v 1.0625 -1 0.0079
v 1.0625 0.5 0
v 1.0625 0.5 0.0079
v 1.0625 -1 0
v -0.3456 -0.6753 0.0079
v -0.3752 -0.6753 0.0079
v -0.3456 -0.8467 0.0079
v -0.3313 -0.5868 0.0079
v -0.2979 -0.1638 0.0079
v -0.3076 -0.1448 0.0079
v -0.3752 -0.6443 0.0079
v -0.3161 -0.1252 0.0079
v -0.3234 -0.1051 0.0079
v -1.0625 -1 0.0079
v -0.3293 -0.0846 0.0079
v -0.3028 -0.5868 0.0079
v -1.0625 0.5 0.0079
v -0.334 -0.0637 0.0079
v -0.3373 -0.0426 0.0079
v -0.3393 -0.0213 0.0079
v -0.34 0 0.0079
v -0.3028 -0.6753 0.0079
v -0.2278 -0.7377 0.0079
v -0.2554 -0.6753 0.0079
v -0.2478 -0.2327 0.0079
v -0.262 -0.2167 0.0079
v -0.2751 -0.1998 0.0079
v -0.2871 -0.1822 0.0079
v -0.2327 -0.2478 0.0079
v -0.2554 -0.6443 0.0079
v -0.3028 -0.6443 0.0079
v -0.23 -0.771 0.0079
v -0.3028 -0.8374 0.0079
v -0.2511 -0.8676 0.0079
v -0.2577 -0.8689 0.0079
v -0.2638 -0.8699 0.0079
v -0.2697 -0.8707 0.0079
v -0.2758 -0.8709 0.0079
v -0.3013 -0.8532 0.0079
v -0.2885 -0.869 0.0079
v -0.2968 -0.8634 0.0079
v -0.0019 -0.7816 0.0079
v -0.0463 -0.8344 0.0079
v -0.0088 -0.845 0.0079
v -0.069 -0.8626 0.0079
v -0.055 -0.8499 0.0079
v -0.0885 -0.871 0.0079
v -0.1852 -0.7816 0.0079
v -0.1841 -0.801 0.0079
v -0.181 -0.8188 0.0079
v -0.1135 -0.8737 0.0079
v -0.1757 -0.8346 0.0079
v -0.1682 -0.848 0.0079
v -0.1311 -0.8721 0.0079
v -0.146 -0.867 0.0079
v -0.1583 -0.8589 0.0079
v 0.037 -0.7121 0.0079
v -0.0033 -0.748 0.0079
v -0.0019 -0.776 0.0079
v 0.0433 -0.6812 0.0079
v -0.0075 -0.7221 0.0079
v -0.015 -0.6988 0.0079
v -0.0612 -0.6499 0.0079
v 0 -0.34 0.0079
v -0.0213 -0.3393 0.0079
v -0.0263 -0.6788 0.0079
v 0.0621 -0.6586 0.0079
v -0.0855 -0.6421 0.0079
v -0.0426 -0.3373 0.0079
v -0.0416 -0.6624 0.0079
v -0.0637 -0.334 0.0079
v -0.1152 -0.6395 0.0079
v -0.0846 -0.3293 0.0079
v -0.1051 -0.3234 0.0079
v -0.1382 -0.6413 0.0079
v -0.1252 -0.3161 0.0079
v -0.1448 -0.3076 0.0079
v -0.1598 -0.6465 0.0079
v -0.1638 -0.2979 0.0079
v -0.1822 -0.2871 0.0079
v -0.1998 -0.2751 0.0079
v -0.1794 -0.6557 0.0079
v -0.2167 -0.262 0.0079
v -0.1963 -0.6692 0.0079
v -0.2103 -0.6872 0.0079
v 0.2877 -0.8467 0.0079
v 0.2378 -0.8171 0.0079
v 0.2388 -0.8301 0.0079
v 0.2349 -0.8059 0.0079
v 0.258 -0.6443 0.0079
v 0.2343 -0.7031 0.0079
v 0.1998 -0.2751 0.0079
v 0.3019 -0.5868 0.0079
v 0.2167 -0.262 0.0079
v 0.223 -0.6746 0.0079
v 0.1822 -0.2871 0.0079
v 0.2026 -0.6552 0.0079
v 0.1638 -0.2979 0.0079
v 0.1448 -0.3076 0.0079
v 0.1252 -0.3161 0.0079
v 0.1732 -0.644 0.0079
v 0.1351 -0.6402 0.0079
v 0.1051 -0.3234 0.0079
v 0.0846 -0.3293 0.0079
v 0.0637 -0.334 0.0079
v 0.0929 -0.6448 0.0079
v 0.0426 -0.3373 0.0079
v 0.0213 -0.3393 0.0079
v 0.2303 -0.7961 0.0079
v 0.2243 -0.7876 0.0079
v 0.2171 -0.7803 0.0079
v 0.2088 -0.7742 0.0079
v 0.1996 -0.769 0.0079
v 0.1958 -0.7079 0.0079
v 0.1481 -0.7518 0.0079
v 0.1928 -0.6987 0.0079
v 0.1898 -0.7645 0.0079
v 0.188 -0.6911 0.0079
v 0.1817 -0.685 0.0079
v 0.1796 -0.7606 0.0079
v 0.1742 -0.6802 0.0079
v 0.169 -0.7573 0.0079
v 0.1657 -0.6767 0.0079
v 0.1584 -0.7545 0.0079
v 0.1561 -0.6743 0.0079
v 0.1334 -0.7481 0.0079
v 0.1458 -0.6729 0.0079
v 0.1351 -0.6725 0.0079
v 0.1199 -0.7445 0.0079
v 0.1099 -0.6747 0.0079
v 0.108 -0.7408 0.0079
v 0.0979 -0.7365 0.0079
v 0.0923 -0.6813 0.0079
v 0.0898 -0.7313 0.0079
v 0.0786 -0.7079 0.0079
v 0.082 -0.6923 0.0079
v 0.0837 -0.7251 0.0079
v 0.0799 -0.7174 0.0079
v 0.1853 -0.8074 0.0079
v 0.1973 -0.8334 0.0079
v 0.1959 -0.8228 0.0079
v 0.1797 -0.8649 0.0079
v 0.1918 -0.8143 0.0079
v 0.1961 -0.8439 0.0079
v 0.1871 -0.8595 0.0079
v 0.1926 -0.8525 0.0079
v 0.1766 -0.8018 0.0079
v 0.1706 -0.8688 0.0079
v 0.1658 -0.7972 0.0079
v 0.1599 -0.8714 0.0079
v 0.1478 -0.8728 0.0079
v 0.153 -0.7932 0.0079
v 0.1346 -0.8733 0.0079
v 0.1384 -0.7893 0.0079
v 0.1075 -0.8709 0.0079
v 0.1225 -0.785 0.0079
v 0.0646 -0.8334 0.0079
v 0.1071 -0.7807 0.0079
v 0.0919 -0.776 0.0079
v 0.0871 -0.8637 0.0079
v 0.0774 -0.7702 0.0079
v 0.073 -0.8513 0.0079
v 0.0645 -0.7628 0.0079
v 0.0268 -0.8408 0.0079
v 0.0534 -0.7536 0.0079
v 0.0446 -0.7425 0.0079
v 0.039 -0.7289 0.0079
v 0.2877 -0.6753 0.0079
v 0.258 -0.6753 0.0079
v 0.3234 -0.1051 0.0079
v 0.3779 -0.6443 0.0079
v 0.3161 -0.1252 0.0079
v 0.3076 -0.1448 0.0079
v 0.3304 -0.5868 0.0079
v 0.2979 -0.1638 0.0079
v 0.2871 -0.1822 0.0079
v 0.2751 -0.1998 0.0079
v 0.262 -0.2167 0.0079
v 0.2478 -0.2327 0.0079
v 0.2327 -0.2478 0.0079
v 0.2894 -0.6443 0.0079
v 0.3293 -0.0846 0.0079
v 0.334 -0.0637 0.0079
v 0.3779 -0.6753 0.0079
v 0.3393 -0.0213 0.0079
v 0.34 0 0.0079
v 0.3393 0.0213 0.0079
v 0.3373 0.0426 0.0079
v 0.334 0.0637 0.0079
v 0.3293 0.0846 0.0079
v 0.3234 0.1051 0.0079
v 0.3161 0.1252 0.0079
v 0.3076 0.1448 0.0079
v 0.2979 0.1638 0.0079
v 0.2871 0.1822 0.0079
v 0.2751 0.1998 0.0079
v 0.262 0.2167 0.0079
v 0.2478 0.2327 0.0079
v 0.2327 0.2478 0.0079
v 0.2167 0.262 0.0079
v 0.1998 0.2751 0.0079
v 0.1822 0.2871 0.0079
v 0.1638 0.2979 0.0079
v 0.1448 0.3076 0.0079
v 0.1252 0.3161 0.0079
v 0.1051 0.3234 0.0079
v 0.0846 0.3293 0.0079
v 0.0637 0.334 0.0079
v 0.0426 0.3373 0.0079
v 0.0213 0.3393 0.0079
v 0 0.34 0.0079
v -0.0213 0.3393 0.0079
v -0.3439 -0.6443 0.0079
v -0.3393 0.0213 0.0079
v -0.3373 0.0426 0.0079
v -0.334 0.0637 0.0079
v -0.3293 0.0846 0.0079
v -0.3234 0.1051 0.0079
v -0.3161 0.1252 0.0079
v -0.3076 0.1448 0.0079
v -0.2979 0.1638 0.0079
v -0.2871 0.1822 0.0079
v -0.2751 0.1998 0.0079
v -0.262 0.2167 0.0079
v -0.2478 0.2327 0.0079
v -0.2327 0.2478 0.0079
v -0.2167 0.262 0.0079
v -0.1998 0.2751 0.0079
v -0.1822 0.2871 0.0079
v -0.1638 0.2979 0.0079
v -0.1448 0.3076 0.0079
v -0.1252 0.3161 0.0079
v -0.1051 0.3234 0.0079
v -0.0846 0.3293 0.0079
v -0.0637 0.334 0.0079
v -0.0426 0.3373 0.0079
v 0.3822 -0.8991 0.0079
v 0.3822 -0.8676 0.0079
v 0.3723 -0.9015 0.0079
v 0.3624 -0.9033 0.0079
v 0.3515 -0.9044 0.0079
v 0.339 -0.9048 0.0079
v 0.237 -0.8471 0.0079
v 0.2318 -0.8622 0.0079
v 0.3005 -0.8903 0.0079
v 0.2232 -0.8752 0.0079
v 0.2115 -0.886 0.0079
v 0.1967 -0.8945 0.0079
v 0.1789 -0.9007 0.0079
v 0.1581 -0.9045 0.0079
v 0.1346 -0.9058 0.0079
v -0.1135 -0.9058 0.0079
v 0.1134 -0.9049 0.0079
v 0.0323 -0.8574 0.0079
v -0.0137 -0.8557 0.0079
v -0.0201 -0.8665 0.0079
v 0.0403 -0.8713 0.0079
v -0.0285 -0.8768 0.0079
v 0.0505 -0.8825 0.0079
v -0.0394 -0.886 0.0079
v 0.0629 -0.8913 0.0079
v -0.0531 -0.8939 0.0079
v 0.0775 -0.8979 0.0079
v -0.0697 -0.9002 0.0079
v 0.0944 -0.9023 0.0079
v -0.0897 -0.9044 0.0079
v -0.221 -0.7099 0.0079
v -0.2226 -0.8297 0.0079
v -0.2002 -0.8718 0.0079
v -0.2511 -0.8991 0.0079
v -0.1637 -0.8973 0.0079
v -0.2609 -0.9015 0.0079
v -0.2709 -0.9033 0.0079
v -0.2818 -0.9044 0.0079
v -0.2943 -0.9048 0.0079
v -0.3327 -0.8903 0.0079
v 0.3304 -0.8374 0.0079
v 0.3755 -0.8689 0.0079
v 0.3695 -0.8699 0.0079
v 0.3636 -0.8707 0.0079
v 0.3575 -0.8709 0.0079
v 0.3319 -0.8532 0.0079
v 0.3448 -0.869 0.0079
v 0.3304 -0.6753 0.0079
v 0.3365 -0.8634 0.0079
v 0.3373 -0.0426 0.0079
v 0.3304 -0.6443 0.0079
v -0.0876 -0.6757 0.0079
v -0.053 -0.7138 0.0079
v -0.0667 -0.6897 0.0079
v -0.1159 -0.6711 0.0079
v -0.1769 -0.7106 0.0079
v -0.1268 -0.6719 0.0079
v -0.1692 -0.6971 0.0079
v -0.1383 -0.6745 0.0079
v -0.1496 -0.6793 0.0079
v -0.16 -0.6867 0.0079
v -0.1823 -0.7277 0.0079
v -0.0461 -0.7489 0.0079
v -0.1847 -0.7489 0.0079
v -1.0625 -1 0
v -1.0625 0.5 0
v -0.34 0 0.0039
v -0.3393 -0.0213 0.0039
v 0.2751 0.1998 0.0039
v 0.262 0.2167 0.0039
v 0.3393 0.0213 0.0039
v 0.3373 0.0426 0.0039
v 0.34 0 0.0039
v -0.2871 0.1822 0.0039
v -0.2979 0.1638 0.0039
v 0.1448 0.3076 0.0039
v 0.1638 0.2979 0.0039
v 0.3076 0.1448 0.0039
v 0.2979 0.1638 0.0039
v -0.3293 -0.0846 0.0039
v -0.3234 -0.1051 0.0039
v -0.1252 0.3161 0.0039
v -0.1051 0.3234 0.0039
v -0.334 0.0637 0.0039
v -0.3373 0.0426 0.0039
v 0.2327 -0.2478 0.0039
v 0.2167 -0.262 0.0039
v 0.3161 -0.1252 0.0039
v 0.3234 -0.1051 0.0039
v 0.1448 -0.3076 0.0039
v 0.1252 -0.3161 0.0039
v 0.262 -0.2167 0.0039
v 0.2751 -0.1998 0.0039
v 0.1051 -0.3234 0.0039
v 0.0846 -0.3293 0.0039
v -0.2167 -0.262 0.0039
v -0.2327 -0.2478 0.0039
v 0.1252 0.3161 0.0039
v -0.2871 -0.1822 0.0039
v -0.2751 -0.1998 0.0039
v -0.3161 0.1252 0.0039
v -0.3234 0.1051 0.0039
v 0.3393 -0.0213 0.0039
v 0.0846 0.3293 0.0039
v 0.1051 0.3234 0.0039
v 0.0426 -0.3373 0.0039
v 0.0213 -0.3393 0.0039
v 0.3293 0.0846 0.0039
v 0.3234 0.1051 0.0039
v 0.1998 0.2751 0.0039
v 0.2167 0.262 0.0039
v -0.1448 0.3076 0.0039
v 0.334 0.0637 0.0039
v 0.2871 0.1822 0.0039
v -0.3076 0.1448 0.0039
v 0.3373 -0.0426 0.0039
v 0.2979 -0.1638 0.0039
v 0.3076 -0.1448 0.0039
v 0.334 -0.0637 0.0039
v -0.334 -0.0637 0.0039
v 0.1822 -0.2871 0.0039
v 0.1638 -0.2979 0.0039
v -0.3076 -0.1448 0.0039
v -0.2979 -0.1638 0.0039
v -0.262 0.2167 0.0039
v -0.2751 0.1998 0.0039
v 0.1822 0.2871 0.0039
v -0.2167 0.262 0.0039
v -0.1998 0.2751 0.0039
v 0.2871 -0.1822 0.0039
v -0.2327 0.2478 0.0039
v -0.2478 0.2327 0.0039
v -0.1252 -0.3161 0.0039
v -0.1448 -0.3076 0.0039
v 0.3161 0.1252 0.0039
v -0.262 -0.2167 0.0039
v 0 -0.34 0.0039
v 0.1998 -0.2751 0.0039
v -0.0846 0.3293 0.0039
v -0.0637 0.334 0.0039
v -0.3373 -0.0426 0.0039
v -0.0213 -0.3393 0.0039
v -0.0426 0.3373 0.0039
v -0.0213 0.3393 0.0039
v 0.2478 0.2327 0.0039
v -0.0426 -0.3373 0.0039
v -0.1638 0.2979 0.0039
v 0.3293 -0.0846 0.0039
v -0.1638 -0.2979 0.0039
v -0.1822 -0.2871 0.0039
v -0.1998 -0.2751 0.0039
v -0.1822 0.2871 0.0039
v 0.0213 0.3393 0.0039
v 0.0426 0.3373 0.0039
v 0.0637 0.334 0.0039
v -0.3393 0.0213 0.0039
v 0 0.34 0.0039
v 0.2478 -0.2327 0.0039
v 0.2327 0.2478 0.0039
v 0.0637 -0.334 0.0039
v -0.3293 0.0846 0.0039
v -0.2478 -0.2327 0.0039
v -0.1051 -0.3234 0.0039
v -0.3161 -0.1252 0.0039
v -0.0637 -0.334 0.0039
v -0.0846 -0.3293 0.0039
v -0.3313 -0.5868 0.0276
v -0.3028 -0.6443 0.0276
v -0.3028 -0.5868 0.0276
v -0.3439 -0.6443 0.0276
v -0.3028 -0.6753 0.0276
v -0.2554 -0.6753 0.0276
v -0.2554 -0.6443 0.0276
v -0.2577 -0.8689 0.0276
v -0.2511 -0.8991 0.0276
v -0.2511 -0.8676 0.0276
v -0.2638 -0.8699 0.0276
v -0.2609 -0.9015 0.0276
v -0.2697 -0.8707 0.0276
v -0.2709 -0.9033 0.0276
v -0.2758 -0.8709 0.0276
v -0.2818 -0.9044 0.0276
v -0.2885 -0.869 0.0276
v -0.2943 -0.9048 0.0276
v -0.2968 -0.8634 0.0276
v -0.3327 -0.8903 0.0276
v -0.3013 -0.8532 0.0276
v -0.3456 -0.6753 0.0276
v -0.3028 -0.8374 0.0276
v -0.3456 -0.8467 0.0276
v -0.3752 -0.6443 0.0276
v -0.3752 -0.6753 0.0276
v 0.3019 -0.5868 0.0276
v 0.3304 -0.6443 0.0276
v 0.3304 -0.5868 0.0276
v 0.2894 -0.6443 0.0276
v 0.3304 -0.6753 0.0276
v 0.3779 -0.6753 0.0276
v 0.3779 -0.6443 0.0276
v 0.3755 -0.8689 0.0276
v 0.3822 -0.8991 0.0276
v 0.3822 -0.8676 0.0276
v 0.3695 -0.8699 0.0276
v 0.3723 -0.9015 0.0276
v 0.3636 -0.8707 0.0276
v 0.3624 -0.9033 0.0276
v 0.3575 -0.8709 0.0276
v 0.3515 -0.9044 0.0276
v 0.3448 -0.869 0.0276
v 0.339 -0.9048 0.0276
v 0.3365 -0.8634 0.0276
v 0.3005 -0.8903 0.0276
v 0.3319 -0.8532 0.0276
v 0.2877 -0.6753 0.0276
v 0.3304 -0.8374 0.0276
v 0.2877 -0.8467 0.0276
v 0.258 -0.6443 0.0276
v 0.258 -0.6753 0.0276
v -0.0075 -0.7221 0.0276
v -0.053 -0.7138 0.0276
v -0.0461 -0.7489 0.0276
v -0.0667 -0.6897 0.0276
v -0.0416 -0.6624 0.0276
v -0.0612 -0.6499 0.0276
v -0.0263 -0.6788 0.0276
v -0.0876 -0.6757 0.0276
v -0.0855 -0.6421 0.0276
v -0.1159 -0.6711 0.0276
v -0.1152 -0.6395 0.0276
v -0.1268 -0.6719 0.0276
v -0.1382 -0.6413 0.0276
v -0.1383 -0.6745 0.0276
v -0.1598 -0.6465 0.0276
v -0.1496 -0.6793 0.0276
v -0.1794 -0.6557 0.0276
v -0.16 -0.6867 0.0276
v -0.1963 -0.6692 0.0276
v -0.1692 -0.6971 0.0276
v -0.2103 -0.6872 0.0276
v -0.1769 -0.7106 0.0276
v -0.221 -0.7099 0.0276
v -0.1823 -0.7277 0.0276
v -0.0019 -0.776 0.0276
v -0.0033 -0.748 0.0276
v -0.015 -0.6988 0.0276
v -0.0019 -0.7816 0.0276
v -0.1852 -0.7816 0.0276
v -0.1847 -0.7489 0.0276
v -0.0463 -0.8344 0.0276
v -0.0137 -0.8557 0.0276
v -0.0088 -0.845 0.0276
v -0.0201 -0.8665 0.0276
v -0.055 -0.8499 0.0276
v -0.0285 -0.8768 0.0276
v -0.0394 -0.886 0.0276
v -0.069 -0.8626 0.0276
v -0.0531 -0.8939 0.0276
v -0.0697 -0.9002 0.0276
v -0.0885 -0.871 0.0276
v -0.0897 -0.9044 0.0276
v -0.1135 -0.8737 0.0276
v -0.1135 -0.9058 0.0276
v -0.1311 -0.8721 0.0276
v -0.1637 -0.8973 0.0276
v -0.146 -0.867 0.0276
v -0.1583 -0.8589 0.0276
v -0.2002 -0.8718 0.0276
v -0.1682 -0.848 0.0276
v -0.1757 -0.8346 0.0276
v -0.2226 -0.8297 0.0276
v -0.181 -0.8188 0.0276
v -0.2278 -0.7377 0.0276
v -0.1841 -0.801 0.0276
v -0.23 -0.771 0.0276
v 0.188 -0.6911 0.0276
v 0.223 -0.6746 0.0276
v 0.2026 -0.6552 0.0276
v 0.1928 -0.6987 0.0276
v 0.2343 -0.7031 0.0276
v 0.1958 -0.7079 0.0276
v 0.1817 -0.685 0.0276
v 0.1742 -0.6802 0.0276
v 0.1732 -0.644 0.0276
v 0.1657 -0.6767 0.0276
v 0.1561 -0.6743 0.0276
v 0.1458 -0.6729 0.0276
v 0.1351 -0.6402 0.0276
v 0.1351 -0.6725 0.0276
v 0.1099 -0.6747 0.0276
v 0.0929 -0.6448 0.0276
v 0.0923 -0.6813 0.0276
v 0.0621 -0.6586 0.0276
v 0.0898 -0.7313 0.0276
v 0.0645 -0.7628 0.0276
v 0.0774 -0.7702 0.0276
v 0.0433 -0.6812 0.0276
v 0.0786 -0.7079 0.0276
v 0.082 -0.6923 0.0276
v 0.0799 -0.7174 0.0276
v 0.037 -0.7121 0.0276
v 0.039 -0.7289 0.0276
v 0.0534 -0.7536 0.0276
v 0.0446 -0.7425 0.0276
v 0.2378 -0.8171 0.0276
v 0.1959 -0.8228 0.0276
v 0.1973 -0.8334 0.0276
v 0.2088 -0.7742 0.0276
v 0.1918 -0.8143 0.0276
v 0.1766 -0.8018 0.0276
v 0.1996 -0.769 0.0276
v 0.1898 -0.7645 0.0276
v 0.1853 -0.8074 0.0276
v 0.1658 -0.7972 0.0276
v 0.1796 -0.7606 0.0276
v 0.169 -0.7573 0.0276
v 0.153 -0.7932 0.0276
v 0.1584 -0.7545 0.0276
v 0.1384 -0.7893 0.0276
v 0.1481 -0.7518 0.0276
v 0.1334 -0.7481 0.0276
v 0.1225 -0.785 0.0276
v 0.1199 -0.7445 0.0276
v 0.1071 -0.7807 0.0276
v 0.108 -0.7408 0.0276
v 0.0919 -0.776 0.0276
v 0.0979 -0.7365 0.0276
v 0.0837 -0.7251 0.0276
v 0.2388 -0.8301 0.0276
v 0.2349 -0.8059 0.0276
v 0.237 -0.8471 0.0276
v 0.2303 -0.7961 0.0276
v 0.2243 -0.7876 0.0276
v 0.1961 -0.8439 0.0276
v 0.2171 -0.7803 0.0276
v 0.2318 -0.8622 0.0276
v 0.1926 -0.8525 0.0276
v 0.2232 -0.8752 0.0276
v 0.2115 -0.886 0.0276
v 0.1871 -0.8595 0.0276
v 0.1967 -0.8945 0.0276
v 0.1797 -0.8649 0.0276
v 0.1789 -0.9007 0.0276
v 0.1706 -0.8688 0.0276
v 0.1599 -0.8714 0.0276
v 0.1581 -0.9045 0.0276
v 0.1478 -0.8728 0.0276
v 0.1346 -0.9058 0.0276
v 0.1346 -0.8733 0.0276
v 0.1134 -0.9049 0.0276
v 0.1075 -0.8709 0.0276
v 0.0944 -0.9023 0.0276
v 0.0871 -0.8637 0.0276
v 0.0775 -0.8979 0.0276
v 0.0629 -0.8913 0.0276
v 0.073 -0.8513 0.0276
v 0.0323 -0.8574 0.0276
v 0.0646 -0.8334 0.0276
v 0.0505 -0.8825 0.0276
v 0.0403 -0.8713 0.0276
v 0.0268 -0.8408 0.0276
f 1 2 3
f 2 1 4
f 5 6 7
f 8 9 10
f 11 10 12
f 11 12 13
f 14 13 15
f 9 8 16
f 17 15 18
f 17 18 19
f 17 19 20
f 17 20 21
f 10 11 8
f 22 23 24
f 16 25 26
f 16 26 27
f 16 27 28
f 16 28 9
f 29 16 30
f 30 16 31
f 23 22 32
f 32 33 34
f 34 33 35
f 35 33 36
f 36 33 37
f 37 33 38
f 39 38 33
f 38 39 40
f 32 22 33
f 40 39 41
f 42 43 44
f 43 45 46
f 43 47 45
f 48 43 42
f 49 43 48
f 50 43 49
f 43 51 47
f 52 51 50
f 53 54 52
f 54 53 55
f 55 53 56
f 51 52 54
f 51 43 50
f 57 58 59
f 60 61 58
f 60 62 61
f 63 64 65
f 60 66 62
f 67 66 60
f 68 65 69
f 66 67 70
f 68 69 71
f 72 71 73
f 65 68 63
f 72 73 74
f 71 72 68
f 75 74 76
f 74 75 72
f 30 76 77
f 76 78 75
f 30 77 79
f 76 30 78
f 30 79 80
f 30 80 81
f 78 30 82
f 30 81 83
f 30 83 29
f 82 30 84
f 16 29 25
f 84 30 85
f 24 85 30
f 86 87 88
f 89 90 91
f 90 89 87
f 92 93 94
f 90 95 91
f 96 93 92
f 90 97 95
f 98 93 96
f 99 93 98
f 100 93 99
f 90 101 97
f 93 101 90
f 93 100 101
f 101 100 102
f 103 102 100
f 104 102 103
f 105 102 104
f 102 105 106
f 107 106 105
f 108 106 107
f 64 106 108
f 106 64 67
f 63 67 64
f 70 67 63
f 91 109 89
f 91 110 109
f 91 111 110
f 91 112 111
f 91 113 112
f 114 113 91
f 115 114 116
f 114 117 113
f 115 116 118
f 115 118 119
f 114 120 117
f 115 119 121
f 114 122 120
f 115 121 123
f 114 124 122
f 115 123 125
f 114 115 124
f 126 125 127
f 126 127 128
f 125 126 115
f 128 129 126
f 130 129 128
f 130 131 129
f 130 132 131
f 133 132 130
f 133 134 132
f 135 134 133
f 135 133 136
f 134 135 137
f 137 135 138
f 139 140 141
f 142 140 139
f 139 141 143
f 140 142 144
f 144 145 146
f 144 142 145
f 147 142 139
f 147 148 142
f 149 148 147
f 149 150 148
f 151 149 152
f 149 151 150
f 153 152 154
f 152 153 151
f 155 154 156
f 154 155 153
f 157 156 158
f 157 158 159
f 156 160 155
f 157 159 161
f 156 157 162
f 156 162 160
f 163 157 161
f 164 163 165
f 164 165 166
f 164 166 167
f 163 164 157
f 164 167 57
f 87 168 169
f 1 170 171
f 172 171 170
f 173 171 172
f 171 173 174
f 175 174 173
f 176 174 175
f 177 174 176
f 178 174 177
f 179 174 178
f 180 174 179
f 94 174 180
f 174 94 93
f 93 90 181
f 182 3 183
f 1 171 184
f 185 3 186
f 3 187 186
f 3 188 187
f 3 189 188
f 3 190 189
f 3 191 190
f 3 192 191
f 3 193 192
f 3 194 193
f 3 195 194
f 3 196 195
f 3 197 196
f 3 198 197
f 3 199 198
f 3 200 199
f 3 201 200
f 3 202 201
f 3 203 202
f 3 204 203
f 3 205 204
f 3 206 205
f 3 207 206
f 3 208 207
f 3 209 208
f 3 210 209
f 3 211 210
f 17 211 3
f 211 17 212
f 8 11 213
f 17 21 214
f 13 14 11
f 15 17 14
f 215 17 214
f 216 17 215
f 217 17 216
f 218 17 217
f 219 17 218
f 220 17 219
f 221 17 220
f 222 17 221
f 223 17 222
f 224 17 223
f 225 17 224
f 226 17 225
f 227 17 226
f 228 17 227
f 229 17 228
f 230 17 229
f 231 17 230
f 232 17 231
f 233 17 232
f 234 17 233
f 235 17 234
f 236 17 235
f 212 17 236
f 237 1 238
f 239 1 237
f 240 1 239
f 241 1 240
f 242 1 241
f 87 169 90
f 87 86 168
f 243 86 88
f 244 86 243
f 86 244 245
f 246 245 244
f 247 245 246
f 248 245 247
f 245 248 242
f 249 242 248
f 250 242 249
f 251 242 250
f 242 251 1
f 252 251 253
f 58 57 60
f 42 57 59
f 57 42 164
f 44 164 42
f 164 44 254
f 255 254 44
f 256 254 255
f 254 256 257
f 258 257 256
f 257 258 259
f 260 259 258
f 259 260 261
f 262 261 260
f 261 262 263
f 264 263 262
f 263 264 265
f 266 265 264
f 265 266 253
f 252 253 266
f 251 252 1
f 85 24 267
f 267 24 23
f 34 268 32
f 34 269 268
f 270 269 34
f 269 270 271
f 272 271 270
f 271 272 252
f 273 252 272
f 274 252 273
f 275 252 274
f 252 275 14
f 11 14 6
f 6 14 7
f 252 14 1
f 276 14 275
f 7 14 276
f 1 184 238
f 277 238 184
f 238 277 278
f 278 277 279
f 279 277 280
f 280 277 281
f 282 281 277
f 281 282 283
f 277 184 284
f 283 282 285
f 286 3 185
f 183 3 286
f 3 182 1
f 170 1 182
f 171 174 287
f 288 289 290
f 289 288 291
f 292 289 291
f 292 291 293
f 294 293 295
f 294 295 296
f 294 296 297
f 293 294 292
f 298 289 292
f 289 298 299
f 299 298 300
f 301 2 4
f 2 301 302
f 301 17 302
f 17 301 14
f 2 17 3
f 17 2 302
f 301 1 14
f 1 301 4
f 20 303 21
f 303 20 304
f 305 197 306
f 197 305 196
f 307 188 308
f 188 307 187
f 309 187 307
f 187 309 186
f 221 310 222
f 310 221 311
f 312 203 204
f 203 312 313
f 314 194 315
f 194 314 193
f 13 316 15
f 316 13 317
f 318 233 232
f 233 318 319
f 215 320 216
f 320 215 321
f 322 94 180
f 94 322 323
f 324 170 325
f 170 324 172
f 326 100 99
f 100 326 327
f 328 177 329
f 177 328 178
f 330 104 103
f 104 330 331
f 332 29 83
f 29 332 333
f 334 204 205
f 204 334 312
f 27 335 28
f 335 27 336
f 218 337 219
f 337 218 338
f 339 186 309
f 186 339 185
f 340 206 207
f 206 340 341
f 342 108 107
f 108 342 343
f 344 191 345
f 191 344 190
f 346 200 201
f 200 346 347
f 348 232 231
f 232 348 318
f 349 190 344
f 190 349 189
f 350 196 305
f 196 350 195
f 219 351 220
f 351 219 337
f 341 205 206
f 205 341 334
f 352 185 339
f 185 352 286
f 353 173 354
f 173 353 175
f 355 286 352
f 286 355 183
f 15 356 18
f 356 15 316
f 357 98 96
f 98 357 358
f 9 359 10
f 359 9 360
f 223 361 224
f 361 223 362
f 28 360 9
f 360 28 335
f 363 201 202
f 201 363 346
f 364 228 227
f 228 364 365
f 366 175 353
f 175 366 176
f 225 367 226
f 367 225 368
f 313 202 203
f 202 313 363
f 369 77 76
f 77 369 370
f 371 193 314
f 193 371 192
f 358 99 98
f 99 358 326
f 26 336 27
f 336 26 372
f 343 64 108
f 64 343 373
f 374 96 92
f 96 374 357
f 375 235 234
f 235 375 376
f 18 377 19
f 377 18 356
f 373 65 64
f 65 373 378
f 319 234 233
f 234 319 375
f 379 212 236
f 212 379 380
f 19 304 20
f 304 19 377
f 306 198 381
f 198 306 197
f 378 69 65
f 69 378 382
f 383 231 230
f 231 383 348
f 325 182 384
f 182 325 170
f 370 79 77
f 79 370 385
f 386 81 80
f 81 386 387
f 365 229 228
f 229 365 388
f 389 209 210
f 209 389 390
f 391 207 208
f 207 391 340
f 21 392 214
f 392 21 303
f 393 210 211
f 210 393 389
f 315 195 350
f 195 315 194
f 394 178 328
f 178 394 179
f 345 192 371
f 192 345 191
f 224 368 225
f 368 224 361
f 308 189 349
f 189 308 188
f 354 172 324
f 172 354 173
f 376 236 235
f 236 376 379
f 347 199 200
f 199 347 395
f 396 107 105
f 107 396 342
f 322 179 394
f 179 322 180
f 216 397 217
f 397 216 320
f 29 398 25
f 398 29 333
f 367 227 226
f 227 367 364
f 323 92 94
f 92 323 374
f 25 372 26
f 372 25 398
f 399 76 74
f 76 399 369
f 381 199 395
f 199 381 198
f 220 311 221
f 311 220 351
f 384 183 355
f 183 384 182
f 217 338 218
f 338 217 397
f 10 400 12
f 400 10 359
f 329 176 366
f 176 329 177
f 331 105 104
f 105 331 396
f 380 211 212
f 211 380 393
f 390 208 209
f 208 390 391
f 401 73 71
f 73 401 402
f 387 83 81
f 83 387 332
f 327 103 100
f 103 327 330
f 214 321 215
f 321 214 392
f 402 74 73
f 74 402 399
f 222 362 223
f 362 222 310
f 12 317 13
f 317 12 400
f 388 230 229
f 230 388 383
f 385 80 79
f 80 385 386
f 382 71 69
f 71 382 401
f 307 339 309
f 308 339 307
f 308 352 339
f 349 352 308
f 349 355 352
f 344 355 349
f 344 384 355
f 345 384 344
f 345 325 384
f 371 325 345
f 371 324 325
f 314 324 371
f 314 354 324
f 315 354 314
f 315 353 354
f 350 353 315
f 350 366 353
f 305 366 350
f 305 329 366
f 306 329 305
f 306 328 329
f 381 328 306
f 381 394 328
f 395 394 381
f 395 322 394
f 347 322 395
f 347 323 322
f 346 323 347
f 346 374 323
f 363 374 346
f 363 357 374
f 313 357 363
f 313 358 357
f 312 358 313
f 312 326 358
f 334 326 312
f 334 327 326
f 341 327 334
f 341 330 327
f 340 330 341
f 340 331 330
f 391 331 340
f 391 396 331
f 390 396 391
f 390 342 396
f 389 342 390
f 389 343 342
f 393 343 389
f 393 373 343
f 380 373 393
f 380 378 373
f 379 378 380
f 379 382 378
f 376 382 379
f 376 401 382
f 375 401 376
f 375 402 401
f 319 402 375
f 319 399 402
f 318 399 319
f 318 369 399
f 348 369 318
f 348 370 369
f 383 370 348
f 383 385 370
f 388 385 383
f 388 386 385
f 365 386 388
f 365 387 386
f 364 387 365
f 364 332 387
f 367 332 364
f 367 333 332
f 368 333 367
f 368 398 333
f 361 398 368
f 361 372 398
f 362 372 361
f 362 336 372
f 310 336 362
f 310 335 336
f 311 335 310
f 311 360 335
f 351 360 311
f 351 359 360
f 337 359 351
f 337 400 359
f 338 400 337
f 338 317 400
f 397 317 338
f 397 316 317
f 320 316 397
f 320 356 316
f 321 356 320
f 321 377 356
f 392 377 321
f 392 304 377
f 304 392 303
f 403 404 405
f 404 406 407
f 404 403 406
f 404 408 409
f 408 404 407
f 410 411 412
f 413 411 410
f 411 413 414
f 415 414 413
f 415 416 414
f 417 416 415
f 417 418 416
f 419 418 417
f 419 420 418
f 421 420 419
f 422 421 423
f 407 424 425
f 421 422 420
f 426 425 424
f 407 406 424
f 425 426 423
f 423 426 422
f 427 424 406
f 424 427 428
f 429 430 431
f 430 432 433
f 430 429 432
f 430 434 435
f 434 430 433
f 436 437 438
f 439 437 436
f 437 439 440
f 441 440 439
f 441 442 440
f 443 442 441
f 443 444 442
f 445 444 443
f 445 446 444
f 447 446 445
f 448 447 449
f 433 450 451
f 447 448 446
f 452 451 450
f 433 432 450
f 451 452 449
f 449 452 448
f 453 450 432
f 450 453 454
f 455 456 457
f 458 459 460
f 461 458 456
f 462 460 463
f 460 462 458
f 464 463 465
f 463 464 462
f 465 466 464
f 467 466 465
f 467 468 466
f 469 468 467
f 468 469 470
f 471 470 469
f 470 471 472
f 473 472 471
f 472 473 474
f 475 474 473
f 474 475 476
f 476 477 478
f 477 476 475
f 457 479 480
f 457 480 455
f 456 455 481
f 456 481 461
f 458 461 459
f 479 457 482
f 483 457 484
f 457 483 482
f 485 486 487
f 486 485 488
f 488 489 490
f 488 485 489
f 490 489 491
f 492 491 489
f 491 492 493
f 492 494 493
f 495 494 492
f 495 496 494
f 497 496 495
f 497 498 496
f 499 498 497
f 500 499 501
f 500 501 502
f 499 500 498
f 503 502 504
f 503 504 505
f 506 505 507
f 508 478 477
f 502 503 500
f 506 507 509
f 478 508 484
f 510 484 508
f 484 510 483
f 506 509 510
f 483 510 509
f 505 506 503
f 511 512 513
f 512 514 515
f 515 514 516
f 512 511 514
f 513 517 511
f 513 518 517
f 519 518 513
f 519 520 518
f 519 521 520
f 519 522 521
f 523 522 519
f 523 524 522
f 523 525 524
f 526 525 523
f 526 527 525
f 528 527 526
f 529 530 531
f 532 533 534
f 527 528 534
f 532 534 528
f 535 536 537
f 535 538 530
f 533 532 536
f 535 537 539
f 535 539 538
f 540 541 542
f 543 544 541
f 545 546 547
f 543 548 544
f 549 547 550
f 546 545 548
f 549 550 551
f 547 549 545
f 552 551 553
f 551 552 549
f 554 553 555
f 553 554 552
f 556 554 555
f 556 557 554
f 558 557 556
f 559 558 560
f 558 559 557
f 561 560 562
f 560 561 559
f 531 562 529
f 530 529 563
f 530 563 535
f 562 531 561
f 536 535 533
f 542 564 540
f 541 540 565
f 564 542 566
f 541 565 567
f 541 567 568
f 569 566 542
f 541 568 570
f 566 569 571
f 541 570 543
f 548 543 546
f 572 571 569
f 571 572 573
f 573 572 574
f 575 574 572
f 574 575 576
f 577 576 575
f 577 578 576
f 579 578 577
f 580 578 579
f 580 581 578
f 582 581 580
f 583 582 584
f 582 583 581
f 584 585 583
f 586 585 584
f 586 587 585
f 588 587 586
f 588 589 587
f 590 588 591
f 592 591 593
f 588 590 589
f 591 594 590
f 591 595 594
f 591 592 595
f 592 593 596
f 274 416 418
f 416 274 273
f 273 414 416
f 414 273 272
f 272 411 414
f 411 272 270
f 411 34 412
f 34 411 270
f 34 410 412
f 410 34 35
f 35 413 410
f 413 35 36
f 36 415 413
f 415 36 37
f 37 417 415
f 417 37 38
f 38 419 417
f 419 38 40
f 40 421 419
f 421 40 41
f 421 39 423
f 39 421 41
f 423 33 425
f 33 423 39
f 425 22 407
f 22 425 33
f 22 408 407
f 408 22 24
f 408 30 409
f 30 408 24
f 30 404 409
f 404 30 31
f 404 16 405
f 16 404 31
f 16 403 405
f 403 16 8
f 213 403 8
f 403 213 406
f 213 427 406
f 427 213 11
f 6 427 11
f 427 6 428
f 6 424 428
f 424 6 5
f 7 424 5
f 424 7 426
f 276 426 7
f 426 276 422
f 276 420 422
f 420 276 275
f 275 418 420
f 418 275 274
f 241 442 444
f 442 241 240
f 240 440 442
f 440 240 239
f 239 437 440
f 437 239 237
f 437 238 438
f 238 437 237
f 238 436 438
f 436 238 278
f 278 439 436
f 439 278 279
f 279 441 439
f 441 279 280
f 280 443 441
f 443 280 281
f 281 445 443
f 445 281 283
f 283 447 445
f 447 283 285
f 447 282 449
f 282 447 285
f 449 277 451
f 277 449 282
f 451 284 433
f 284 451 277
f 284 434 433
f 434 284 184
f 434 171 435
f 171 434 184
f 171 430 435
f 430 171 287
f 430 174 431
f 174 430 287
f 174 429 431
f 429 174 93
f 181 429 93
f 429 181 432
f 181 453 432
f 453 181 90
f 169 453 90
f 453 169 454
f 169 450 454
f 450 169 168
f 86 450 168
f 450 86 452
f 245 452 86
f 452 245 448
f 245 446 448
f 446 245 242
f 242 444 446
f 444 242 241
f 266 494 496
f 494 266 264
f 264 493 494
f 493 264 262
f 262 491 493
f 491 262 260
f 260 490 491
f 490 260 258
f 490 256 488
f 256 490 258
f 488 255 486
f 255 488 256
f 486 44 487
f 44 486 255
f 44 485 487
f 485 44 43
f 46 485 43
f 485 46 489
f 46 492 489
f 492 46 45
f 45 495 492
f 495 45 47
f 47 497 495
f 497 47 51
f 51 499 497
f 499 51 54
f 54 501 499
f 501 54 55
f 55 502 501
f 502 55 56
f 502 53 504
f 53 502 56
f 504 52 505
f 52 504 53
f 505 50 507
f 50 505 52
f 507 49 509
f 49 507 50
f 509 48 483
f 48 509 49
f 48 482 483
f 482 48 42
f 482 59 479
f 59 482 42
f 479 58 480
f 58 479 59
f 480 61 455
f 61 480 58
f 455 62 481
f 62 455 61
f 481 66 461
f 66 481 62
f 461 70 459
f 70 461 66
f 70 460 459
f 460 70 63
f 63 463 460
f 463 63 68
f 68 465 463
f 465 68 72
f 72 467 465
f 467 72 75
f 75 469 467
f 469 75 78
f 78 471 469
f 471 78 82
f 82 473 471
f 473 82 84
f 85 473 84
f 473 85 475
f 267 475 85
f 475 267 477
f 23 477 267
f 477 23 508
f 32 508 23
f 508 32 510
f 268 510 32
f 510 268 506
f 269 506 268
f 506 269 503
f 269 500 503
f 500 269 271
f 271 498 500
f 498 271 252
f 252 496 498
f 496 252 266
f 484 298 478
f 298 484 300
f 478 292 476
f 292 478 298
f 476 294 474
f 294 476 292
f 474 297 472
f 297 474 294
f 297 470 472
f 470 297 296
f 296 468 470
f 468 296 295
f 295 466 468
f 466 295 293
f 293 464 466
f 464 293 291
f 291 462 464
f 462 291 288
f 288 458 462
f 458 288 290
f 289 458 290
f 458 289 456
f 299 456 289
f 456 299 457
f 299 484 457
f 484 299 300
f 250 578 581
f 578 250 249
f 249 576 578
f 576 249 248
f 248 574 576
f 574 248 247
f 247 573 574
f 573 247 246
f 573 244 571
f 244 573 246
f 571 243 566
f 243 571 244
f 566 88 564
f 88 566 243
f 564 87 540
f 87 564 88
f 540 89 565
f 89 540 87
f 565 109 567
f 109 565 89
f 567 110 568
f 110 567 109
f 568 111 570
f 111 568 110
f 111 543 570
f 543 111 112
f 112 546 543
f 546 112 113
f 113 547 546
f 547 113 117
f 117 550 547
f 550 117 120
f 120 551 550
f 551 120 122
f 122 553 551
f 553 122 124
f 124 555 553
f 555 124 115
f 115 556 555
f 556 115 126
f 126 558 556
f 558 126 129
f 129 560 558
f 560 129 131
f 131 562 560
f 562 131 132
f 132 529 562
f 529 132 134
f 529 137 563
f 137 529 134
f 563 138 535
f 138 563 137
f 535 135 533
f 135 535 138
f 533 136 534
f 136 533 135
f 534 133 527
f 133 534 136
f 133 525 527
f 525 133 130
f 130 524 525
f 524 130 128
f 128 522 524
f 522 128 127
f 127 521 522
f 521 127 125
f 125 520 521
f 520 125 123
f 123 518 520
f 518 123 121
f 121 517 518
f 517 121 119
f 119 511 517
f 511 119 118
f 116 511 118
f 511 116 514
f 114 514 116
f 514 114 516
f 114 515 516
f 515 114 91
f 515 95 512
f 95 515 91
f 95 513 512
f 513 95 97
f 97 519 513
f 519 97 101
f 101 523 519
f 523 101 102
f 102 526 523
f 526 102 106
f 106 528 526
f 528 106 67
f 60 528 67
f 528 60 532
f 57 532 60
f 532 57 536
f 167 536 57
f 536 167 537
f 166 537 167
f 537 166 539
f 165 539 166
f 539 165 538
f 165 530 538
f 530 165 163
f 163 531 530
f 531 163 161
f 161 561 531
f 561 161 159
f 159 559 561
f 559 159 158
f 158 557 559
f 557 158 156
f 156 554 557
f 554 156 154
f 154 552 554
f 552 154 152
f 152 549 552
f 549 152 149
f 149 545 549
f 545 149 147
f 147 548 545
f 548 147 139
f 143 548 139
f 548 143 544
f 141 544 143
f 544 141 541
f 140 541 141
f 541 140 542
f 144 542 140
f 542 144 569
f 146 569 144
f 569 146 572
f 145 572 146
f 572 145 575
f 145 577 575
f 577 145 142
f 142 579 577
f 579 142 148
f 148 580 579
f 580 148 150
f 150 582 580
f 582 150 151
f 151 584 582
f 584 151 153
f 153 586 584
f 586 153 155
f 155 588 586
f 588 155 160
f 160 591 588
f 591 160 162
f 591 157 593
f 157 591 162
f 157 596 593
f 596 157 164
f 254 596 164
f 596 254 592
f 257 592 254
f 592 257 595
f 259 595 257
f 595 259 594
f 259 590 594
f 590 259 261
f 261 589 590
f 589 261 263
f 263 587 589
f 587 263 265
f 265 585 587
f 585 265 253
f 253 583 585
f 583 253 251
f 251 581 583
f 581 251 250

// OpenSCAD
label_text = "test";

mm_to_in = 0.03937805;
layer_height = .2 * mm_to_in;

text_size = 0.35;
text_height = layer_height * 3;
text_x = 0;
text_y = -.75;

union() {
    translate([text_x, text_y, layer_height/2])
        linear_extrude(height = text_height)
            text(
                label_text,
                size = text_size,
                halign = "center",
                valign = "center"
            );
    
    difference() {
        translate([0, -0.25, 1 * layer_height/2])
            cube([2.125, 1.5, layer_height], center = true);
        translate([0, 0, layer_height])
            cylinder(h = layer_height, r = 0.34, $fn = 100, center = true);
    }
}
